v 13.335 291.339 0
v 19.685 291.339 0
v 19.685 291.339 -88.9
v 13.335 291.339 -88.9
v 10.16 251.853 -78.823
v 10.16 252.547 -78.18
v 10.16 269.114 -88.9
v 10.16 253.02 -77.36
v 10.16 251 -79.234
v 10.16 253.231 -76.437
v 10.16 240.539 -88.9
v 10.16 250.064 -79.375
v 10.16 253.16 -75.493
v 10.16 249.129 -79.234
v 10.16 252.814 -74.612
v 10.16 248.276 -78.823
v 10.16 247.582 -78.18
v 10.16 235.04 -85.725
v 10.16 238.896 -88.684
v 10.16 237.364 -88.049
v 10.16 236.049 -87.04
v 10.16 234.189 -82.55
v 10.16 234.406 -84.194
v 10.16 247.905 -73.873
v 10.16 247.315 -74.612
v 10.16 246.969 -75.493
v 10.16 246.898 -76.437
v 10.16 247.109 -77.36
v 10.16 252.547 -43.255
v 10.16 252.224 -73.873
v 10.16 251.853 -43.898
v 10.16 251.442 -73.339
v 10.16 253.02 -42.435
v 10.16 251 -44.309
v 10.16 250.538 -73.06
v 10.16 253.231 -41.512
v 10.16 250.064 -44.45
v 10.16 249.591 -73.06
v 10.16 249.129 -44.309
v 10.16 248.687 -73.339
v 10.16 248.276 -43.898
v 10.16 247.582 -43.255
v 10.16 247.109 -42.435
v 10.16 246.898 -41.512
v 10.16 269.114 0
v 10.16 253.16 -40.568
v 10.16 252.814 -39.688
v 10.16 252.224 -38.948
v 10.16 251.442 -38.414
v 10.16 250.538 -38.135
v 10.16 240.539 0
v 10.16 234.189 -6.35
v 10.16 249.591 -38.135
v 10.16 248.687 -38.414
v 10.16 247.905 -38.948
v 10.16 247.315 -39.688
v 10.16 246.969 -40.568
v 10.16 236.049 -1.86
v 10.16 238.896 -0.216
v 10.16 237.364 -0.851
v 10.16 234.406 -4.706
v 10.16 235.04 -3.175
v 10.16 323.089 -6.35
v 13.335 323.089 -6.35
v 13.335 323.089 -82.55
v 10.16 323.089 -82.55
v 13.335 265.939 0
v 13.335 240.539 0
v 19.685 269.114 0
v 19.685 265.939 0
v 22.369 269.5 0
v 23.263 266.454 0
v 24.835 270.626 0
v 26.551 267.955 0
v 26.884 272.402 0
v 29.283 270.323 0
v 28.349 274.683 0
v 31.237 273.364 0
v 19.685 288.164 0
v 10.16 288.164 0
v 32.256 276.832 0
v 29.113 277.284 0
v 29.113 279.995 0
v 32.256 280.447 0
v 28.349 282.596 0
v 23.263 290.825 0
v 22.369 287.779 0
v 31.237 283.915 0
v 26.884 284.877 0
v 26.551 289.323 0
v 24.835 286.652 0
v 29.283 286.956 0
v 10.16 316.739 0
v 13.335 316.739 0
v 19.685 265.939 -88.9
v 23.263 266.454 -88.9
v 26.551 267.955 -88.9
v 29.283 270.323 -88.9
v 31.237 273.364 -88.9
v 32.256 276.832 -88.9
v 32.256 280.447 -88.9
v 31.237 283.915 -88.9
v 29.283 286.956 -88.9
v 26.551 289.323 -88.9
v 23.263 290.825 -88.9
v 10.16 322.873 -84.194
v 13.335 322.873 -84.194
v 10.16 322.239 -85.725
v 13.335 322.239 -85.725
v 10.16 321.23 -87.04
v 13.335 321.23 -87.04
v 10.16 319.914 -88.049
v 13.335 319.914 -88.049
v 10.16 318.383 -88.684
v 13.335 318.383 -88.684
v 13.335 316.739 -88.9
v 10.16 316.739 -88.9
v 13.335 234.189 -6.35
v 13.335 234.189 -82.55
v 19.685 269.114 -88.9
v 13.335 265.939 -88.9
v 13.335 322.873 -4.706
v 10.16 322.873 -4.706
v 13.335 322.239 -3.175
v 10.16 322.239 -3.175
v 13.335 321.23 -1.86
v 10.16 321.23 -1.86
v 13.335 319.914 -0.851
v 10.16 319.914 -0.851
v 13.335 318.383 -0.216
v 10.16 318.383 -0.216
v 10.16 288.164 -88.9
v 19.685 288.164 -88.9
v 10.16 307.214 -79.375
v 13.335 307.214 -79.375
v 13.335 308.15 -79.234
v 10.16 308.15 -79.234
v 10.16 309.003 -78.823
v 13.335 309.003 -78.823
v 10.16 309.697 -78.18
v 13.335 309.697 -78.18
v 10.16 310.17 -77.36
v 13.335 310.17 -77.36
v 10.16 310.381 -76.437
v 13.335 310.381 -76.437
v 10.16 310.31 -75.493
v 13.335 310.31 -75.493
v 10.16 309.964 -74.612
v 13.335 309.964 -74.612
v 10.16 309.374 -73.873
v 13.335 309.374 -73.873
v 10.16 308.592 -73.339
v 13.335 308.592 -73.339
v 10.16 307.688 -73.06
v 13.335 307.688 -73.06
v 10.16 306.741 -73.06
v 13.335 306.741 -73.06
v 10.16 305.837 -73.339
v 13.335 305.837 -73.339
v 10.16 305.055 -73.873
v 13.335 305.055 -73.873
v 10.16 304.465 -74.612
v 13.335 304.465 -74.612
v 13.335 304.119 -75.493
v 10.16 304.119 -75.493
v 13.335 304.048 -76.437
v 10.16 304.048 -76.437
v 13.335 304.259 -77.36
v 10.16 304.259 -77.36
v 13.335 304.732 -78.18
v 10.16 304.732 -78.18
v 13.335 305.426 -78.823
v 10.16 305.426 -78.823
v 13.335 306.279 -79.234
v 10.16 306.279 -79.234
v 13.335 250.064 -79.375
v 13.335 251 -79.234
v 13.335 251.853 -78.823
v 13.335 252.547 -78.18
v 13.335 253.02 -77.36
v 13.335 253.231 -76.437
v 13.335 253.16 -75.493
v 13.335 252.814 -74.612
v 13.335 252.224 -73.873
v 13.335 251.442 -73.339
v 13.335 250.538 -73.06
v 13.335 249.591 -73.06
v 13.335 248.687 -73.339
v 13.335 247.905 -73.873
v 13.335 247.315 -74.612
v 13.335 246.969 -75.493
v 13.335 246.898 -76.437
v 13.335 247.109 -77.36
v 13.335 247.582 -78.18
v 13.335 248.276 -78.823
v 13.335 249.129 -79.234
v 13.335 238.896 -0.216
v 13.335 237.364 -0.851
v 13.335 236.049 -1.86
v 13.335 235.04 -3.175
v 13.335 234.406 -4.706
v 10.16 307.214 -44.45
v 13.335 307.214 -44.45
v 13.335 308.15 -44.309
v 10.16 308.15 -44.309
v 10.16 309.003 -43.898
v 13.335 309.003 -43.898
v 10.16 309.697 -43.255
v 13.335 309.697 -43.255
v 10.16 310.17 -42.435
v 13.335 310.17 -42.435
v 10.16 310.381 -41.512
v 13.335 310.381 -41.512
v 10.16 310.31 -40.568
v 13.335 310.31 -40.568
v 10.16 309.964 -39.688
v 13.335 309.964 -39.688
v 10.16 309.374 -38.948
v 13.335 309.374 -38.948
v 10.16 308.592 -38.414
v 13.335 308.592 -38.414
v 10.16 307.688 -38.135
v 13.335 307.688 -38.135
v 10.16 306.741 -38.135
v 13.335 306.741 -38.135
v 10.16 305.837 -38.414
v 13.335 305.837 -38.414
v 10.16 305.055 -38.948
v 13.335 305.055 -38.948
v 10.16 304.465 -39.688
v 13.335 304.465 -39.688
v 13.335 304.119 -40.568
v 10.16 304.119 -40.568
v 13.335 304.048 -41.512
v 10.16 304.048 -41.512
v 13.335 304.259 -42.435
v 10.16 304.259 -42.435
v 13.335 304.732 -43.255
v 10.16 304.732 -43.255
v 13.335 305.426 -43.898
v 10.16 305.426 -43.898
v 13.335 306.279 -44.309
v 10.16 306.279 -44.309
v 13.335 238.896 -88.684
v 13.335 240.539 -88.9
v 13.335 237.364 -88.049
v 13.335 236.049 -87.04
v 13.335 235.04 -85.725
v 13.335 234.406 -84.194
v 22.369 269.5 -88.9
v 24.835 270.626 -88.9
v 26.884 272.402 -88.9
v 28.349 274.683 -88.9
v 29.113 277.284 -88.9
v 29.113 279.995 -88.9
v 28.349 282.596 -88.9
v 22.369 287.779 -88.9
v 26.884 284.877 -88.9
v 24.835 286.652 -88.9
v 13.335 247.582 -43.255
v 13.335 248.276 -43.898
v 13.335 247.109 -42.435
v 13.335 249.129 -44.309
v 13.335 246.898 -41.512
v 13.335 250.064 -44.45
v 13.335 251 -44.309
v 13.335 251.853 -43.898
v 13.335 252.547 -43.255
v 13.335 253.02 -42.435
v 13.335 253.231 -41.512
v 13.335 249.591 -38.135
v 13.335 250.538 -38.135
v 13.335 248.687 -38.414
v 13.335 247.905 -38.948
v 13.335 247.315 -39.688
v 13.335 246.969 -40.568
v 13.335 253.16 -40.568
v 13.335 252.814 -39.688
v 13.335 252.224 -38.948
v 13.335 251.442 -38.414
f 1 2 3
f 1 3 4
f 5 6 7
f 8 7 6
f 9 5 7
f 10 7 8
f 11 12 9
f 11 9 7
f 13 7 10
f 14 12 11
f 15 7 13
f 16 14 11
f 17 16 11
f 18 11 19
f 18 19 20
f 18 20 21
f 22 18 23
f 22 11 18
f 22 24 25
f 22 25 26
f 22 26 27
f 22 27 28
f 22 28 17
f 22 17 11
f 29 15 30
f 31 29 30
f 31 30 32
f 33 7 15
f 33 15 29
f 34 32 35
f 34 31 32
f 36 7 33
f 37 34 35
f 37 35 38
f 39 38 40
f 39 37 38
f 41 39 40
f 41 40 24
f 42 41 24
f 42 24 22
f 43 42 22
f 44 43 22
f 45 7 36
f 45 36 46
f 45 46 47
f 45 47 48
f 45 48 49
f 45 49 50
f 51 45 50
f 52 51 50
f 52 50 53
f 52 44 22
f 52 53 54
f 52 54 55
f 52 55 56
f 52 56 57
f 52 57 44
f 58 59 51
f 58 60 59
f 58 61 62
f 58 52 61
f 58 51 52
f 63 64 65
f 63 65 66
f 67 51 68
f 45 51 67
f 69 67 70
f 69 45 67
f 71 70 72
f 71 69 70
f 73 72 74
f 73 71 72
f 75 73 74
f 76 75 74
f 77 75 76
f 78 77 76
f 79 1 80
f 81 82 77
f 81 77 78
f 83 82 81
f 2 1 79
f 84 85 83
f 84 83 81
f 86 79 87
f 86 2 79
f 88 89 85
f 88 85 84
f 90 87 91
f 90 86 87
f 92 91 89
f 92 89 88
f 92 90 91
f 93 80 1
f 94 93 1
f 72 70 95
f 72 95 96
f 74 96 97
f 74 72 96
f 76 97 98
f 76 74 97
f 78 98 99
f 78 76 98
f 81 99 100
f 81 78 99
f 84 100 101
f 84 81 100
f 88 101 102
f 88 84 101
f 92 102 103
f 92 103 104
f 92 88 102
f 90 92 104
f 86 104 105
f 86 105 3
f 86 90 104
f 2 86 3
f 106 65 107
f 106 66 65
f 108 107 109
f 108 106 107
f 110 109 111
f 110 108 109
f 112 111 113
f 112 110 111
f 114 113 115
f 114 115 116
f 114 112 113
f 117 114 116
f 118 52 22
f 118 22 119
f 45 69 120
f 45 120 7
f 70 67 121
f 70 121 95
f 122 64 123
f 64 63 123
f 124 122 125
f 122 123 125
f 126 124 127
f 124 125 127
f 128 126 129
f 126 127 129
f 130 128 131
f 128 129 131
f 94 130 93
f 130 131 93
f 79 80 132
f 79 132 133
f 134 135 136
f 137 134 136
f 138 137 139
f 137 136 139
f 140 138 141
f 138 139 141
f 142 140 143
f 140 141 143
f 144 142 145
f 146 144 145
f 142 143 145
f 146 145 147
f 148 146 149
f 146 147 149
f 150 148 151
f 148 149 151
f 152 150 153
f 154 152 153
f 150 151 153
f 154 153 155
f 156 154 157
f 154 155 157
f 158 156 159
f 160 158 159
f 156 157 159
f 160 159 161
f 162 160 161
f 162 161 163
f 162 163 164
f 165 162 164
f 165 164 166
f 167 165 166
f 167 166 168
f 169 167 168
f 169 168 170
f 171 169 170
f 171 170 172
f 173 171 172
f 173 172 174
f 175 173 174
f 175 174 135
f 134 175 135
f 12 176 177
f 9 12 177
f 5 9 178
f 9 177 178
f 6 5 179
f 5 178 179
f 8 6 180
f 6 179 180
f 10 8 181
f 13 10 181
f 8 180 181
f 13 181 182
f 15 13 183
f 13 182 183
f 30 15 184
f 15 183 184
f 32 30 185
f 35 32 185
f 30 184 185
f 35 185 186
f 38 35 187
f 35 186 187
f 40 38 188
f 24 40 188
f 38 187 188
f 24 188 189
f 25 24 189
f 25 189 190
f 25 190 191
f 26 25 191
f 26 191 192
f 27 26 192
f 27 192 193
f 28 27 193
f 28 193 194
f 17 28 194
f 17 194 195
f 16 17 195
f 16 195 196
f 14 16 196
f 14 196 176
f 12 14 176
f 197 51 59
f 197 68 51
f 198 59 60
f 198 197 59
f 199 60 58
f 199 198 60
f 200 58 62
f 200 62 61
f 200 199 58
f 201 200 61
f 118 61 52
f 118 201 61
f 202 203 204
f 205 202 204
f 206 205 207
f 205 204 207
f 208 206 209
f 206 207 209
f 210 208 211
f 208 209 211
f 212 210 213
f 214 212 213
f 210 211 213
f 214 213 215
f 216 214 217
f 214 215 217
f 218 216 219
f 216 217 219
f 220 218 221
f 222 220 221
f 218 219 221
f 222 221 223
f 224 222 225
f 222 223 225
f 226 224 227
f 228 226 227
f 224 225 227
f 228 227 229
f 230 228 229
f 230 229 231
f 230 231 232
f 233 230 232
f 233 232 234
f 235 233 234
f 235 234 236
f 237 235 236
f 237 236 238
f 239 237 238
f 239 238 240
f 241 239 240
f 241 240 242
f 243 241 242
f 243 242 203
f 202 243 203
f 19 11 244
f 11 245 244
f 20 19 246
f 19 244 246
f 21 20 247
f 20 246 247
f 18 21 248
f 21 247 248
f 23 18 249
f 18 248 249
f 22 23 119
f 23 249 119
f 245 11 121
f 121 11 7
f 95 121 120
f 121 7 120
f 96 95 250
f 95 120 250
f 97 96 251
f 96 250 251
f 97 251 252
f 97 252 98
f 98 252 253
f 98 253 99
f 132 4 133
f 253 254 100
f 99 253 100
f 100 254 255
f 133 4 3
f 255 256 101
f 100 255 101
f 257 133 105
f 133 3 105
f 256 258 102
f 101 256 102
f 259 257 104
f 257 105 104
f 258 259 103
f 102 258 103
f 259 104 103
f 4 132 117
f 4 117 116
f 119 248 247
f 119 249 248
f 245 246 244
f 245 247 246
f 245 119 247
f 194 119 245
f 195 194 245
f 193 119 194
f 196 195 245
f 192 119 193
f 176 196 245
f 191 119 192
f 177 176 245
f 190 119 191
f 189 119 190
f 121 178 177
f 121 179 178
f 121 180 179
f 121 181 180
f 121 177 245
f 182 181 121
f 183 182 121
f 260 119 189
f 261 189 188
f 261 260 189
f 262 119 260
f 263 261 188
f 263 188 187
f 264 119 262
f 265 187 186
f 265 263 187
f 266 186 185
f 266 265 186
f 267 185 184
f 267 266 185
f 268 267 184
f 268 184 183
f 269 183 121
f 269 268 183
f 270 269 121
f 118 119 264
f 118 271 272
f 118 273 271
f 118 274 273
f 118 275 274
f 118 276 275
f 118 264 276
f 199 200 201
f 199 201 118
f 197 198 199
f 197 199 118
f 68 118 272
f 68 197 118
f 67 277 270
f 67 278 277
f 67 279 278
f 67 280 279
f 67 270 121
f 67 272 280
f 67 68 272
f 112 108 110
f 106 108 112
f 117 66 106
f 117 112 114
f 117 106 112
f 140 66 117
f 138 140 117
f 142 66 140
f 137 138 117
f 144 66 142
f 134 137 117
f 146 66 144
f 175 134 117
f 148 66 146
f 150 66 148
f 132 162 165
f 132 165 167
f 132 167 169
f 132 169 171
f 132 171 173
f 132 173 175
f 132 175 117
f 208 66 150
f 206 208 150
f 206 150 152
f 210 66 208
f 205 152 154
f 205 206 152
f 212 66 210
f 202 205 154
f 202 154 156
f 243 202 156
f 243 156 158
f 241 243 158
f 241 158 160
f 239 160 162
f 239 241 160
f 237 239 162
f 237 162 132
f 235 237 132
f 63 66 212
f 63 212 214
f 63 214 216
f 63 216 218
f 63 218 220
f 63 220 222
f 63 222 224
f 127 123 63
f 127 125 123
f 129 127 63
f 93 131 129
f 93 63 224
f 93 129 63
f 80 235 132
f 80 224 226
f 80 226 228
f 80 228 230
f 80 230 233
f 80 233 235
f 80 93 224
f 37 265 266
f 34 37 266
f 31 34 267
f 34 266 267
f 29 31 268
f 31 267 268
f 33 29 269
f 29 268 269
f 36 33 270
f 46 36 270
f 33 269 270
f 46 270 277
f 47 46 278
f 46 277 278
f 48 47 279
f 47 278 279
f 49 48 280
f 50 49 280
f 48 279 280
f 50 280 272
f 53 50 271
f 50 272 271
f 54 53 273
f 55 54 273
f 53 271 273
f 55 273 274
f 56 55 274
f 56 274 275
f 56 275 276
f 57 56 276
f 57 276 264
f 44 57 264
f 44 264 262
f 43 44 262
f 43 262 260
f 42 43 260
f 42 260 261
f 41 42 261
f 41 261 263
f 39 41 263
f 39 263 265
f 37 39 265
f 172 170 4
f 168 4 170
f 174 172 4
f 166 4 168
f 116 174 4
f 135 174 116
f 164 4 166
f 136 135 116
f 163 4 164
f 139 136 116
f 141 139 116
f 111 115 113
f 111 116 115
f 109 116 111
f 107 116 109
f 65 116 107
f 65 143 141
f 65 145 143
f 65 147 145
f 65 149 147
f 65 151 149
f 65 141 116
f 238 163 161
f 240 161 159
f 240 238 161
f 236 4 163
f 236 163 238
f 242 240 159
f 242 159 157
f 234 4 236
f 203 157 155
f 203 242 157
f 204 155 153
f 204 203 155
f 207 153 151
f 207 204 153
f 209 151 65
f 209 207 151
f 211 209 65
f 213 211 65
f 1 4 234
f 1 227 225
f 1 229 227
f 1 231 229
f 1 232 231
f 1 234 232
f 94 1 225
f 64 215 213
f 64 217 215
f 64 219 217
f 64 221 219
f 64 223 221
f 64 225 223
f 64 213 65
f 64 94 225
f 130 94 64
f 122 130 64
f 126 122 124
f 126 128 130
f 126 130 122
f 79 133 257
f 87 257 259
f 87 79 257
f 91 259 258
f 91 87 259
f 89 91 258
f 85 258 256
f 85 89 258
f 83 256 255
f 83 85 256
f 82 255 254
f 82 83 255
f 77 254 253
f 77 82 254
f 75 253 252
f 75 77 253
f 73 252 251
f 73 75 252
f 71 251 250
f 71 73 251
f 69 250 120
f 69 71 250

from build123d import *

# Parameters (mm, degrees)
BOSS_EXTRUDE1_DEPTH = 88.9
SKETCH2_R           = 3.175
CUT_EXTRUDE1_DEPTH  = 4.175
FILLET1_R           = 6.35


with BuildPart() as part:
    # Sketch1 → Boss-Extrude1 (new body)
    with BuildSketch(Plane.XY):
        with BuildLine():
            Line((13.335, 323.089397322), (10.16, 323.089397322))
            Line((10.16, 323.089397322), (10.16, 288.164397322))
            Line((10.16, 288.164397322), (19.685, 288.164397322))
            ThreePointArc((19.685, 288.164397322), (29.21, 278.639397322), (19.685, 269.114397322))
            Line((19.685, 269.114397322), (10.16, 269.114397322))
            Line((10.16, 269.114397322), (10.16, 234.189397322))
            Line((10.16, 234.189397322), (13.335, 234.189397322))
            Line((13.335, 234.189397322), (13.335, 265.939397322))
            Line((13.335, 265.939397322), (19.685, 265.939397322))
            ThreePointArc((19.685, 265.939397322), (32.385, 278.639397322), (19.685, 291.339397322))
            Line((19.685, 291.339397322), (13.335, 291.339397322))
            Line((13.335, 291.339397322), (13.335, 323.089397322))
        make_face()
    extrude(amount=-BOSS_EXTRUDE1_DEPTH)

    # Sketch2 → Cut-Extrude1 (cut, through all)
    with BuildSketch(Plane(origin=(13.335, 0, 0), x_dir=(0, 0, -1), z_dir=(1, 0, 0))):
        with Locations((41.275, 250.064397322)):
            Circle(SKETCH2_R)
        with Locations((76.2, 250.064397322)):
            Circle(SKETCH2_R)
        with Locations((76.2, 307.214397322)):
            Circle(SKETCH2_R)
        with Locations((41.275, 307.214397322)):
            Circle(SKETCH2_R)
    extrude(amount=-CUT_EXTRUDE1_DEPTH, mode=Mode.SUBTRACT)

    # Fillet1
    fillet1_edges = [part.edges().sort_by_distance(p)[0] for p in [
        (11.7475, 323.089397322, 0),
        (11.7475, 234.189397322, 0),
        (11.7475, 234.189397322, -88.9),
        (11.7475, 323.089397322, -88.9),
    ]]
    fillet(fillet1_edges, radius=FILLET1_R)


solid = part.part
